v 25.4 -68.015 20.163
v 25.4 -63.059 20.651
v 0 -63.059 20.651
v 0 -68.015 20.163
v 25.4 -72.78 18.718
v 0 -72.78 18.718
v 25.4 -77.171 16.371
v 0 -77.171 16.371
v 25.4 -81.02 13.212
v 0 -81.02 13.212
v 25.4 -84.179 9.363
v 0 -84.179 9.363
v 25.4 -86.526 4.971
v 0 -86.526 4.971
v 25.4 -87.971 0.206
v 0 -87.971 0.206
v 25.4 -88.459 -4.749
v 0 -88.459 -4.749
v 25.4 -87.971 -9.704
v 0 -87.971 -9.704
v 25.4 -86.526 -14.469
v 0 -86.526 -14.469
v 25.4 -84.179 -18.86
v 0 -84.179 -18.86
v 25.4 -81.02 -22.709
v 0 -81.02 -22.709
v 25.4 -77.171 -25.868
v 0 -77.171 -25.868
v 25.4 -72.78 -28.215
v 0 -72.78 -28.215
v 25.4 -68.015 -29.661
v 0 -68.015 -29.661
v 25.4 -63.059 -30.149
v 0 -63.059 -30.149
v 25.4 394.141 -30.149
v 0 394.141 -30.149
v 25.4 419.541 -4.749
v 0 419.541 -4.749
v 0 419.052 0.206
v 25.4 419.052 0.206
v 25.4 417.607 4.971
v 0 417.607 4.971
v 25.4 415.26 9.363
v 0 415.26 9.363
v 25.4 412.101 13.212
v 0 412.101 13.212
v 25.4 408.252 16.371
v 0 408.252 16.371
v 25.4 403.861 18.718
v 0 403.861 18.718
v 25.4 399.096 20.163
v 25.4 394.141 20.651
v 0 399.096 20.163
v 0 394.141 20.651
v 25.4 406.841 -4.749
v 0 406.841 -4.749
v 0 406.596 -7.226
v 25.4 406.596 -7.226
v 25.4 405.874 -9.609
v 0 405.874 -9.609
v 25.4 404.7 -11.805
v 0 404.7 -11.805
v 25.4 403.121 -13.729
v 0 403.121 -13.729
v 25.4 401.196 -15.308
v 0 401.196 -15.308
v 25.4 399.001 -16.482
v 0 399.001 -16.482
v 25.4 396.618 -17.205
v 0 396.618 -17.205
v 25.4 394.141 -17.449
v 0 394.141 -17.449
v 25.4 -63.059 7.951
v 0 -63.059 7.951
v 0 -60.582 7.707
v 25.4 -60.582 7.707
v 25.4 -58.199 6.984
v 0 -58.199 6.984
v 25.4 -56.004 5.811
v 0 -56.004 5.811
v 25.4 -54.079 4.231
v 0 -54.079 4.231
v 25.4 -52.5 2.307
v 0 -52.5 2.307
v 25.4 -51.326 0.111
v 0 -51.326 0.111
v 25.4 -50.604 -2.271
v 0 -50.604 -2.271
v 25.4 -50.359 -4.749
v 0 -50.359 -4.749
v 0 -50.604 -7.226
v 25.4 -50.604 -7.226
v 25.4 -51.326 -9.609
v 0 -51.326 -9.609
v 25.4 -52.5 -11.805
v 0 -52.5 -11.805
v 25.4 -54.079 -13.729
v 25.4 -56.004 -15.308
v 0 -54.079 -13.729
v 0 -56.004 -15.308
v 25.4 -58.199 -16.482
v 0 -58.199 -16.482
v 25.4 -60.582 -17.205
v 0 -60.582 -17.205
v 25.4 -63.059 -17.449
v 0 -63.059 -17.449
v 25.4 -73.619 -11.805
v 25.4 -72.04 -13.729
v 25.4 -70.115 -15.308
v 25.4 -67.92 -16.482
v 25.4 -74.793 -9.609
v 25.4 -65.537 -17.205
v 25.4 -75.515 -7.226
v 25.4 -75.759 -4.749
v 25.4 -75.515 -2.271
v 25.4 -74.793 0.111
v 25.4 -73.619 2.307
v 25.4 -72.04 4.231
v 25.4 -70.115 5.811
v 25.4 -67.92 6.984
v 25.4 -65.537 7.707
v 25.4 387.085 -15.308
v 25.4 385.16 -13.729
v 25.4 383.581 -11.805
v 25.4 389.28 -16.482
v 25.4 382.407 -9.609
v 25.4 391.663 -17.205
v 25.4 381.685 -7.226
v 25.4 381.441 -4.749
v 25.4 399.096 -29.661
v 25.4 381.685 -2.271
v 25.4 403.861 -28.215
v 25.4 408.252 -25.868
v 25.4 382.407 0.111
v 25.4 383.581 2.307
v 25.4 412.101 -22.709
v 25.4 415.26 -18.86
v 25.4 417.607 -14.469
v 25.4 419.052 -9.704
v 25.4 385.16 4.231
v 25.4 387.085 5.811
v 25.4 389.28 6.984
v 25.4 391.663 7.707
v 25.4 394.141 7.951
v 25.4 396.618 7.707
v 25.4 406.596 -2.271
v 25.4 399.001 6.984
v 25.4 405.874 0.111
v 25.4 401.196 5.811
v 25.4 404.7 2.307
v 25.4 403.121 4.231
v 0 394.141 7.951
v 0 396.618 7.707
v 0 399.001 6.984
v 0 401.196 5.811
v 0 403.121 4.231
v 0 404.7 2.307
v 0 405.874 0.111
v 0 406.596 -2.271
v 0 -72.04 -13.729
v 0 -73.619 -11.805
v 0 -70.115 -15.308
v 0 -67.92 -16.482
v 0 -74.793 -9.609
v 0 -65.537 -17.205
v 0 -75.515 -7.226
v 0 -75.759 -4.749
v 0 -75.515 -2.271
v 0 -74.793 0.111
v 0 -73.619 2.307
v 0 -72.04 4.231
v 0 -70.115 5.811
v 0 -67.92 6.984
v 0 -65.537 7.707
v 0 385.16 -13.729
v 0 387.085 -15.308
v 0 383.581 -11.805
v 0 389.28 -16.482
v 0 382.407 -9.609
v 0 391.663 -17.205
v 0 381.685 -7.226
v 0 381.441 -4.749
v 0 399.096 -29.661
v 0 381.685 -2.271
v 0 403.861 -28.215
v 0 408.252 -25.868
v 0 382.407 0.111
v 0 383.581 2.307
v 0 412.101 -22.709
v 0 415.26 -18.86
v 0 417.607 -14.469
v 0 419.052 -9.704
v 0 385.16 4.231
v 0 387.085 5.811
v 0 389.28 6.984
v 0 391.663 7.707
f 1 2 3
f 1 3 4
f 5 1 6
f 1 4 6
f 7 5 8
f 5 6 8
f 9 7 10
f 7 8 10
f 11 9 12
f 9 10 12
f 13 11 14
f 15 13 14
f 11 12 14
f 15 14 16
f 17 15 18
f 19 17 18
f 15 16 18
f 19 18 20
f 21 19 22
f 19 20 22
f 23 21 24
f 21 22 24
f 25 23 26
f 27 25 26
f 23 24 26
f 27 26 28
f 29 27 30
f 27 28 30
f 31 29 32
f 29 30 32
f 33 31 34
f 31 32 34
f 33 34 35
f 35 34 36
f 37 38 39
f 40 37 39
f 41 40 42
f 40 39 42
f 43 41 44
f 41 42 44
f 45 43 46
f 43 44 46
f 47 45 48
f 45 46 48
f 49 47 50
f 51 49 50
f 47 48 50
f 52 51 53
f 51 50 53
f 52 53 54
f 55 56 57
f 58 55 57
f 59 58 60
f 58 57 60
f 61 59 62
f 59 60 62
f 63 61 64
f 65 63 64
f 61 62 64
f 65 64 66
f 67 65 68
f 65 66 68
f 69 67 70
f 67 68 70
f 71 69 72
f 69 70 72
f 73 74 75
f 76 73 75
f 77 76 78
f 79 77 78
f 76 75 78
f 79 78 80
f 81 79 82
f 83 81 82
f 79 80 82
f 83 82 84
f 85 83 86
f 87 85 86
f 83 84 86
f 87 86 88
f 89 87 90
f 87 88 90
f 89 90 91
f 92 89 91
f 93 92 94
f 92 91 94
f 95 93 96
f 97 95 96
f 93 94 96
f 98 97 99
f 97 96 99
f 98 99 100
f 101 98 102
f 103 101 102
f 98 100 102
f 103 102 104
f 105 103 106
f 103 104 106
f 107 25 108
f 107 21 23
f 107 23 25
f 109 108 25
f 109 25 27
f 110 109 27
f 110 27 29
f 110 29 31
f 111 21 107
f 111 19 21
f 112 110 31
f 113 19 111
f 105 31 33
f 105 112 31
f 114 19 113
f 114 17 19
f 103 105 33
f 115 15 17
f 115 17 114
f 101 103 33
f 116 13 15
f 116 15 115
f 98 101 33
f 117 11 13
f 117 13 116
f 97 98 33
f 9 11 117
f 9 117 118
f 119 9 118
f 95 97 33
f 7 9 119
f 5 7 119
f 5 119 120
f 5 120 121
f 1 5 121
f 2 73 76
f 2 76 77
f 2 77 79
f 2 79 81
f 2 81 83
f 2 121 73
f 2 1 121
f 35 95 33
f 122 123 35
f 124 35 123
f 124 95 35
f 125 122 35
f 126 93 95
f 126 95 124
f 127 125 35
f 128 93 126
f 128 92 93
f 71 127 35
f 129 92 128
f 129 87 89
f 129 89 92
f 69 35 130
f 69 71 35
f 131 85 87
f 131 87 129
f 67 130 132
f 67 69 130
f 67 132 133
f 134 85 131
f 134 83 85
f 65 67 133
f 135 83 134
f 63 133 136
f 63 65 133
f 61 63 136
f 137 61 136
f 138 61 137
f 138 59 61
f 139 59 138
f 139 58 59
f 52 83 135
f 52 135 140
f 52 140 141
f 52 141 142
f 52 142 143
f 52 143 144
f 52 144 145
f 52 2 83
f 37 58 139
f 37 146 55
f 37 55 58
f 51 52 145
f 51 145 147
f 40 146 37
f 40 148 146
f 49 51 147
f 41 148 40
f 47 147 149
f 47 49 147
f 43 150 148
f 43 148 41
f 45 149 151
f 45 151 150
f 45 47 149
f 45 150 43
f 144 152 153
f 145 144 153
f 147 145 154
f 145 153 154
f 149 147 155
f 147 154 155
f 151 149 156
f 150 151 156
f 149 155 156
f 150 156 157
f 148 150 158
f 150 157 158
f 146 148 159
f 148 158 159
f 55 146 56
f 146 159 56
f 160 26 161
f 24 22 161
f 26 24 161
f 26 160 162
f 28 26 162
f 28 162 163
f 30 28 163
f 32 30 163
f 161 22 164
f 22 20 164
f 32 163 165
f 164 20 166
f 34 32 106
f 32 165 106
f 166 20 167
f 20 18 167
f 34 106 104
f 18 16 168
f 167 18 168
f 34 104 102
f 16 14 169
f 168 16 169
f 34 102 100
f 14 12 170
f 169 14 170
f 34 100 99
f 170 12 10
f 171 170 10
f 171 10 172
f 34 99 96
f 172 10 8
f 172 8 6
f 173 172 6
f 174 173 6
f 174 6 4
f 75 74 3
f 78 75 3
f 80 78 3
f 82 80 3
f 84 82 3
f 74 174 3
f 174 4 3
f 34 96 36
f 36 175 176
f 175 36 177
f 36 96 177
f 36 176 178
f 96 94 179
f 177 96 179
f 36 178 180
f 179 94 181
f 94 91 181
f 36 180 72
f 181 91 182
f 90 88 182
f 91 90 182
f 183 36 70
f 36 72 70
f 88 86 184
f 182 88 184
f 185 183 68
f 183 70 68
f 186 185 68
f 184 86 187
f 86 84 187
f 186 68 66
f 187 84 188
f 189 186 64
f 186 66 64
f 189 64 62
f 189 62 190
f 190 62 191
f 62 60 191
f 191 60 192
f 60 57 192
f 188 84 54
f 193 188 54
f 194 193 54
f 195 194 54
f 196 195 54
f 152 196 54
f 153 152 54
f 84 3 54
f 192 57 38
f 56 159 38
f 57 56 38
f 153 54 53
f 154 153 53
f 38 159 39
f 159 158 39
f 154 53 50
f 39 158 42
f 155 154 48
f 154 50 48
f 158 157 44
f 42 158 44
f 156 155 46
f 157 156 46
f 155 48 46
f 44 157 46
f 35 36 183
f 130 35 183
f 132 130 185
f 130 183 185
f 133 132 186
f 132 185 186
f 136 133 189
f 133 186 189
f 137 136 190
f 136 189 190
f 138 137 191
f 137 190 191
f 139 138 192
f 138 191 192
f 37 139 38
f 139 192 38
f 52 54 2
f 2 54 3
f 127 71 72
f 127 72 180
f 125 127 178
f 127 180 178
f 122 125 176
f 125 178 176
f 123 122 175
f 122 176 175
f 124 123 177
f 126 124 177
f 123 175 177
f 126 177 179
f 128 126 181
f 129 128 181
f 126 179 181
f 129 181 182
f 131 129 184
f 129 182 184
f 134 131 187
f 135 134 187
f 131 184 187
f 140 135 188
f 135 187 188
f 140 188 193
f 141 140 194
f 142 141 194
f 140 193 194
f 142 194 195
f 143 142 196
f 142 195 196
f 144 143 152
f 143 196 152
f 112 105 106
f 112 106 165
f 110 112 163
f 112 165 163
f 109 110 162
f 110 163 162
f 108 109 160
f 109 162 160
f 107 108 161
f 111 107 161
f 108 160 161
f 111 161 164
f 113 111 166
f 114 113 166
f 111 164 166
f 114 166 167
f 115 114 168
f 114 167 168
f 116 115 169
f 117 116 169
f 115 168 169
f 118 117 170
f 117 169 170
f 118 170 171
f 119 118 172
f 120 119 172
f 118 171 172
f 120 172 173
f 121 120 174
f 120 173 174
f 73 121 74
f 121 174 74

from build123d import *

# Parameters (mm, degrees)
F1_DEPTH = 25.4


with BuildPart() as f1:
    # F0 (on Right) → F1 (new body)
    with BuildSketch(Plane.YZ):
        with BuildLine():
            ThreePointArc((-37.6594869553, -4.7487942502), (-45.0989747132, 13.2117179919), (-63.0594869553, 20.6512057498))
            Line((-63.0594869553, 20.6512057498), (-63.0594869553, 7.9512057498))
            ThreePointArc((-63.0594869553, 7.9512057498), (-54.0792308342, 4.2314618709), (-50.3594869553, -4.7487942502))
            ThreePointArc((-50.3594869553, -4.7487942502), (-54.0792308342, -13.7290503713), (-63.0594869553, -17.4487942502))
            Line((-63.0594869553, -17.4487942502), (-63.0594869553, -30.1487942502))
            ThreePointArc((-63.0594869553, -30.1487942502), (-45.0989747132, -22.7093064923), (-37.6594869553, -4.7487942502))
        make_face()
        with BuildLine():
            Line((394.1405130447, 20.6512057498), (-63.0594869553, 20.6512057498))
            ThreePointArc((-63.0594869553, 20.6512057498), (-45.0989747132, 13.2117179919), (-37.6594869553, -4.7487942502))
            ThreePointArc((-37.6594869553, -4.7487942502), (-45.0989747132, -22.7093064923), (-63.0594869553, -30.1487942502))
            Line((-63.0594869553, -30.1487942502), (394.1405130447, -30.1487942502))
            ThreePointArc((394.1405130447, -30.1487942502), (368.7405130447, -4.7487942502), (394.1405130447, 20.6512057498))
        make_face()
        with BuildLine():
            Line((-63.0594869553, 7.9512057498), (-63.0594869553, 20.6512057498))
            ThreePointArc((-63.0594869553, 20.6512057498), (-88.4594869553, -4.7487942502), (-63.0594869553, -30.1487942502))
            Line((-63.0594869553, -30.1487942502), (-63.0594869553, -17.4487942502))
            ThreePointArc((-63.0594869553, -17.4487942502), (-75.7594869553, -4.7487942502), (-63.0594869553, 7.9512057498))
        make_face()
        with BuildLine():
            ThreePointArc((419.5405130447, -4.7487942502), (412.1010252868, 13.2117179919), (394.1405130447, 20.6512057498))
            Line((394.1405130447, 20.6512057498), (394.1405130447, 7.9512057498))
            ThreePointArc((394.1405130447, 7.9512057498), (403.1207691658, 4.2314618709), (406.8405130447, -4.7487942502))
            ThreePointArc((406.8405130447, -4.7487942502), (403.1207691658, -13.7290503713), (394.1405130447, -17.4487942502))
            Line((394.1405130447, -17.4487942502), (394.1405130447, -30.1487942502))
            ThreePointArc((394.1405130447, -30.1487942502), (412.1010252868, -22.7093064923), (419.5405130447, -4.7487942502))
        make_face()
        with BuildLine():
            Line((394.1405130447, 7.9512057498), (394.1405130447, 20.6512057498))
            ThreePointArc((394.1405130447, 20.6512057498), (368.7405130447, -4.7487942502), (394.1405130447, -30.1487942502))
            Line((394.1405130447, -30.1487942502), (394.1405130447, -17.4487942502))
            ThreePointArc((394.1405130447, -17.4487942502), (381.4405130447, -4.7487942502), (394.1405130447, 7.9512057498))
        make_face()
    extrude(amount=F1_DEPTH)


solid = f1.part
